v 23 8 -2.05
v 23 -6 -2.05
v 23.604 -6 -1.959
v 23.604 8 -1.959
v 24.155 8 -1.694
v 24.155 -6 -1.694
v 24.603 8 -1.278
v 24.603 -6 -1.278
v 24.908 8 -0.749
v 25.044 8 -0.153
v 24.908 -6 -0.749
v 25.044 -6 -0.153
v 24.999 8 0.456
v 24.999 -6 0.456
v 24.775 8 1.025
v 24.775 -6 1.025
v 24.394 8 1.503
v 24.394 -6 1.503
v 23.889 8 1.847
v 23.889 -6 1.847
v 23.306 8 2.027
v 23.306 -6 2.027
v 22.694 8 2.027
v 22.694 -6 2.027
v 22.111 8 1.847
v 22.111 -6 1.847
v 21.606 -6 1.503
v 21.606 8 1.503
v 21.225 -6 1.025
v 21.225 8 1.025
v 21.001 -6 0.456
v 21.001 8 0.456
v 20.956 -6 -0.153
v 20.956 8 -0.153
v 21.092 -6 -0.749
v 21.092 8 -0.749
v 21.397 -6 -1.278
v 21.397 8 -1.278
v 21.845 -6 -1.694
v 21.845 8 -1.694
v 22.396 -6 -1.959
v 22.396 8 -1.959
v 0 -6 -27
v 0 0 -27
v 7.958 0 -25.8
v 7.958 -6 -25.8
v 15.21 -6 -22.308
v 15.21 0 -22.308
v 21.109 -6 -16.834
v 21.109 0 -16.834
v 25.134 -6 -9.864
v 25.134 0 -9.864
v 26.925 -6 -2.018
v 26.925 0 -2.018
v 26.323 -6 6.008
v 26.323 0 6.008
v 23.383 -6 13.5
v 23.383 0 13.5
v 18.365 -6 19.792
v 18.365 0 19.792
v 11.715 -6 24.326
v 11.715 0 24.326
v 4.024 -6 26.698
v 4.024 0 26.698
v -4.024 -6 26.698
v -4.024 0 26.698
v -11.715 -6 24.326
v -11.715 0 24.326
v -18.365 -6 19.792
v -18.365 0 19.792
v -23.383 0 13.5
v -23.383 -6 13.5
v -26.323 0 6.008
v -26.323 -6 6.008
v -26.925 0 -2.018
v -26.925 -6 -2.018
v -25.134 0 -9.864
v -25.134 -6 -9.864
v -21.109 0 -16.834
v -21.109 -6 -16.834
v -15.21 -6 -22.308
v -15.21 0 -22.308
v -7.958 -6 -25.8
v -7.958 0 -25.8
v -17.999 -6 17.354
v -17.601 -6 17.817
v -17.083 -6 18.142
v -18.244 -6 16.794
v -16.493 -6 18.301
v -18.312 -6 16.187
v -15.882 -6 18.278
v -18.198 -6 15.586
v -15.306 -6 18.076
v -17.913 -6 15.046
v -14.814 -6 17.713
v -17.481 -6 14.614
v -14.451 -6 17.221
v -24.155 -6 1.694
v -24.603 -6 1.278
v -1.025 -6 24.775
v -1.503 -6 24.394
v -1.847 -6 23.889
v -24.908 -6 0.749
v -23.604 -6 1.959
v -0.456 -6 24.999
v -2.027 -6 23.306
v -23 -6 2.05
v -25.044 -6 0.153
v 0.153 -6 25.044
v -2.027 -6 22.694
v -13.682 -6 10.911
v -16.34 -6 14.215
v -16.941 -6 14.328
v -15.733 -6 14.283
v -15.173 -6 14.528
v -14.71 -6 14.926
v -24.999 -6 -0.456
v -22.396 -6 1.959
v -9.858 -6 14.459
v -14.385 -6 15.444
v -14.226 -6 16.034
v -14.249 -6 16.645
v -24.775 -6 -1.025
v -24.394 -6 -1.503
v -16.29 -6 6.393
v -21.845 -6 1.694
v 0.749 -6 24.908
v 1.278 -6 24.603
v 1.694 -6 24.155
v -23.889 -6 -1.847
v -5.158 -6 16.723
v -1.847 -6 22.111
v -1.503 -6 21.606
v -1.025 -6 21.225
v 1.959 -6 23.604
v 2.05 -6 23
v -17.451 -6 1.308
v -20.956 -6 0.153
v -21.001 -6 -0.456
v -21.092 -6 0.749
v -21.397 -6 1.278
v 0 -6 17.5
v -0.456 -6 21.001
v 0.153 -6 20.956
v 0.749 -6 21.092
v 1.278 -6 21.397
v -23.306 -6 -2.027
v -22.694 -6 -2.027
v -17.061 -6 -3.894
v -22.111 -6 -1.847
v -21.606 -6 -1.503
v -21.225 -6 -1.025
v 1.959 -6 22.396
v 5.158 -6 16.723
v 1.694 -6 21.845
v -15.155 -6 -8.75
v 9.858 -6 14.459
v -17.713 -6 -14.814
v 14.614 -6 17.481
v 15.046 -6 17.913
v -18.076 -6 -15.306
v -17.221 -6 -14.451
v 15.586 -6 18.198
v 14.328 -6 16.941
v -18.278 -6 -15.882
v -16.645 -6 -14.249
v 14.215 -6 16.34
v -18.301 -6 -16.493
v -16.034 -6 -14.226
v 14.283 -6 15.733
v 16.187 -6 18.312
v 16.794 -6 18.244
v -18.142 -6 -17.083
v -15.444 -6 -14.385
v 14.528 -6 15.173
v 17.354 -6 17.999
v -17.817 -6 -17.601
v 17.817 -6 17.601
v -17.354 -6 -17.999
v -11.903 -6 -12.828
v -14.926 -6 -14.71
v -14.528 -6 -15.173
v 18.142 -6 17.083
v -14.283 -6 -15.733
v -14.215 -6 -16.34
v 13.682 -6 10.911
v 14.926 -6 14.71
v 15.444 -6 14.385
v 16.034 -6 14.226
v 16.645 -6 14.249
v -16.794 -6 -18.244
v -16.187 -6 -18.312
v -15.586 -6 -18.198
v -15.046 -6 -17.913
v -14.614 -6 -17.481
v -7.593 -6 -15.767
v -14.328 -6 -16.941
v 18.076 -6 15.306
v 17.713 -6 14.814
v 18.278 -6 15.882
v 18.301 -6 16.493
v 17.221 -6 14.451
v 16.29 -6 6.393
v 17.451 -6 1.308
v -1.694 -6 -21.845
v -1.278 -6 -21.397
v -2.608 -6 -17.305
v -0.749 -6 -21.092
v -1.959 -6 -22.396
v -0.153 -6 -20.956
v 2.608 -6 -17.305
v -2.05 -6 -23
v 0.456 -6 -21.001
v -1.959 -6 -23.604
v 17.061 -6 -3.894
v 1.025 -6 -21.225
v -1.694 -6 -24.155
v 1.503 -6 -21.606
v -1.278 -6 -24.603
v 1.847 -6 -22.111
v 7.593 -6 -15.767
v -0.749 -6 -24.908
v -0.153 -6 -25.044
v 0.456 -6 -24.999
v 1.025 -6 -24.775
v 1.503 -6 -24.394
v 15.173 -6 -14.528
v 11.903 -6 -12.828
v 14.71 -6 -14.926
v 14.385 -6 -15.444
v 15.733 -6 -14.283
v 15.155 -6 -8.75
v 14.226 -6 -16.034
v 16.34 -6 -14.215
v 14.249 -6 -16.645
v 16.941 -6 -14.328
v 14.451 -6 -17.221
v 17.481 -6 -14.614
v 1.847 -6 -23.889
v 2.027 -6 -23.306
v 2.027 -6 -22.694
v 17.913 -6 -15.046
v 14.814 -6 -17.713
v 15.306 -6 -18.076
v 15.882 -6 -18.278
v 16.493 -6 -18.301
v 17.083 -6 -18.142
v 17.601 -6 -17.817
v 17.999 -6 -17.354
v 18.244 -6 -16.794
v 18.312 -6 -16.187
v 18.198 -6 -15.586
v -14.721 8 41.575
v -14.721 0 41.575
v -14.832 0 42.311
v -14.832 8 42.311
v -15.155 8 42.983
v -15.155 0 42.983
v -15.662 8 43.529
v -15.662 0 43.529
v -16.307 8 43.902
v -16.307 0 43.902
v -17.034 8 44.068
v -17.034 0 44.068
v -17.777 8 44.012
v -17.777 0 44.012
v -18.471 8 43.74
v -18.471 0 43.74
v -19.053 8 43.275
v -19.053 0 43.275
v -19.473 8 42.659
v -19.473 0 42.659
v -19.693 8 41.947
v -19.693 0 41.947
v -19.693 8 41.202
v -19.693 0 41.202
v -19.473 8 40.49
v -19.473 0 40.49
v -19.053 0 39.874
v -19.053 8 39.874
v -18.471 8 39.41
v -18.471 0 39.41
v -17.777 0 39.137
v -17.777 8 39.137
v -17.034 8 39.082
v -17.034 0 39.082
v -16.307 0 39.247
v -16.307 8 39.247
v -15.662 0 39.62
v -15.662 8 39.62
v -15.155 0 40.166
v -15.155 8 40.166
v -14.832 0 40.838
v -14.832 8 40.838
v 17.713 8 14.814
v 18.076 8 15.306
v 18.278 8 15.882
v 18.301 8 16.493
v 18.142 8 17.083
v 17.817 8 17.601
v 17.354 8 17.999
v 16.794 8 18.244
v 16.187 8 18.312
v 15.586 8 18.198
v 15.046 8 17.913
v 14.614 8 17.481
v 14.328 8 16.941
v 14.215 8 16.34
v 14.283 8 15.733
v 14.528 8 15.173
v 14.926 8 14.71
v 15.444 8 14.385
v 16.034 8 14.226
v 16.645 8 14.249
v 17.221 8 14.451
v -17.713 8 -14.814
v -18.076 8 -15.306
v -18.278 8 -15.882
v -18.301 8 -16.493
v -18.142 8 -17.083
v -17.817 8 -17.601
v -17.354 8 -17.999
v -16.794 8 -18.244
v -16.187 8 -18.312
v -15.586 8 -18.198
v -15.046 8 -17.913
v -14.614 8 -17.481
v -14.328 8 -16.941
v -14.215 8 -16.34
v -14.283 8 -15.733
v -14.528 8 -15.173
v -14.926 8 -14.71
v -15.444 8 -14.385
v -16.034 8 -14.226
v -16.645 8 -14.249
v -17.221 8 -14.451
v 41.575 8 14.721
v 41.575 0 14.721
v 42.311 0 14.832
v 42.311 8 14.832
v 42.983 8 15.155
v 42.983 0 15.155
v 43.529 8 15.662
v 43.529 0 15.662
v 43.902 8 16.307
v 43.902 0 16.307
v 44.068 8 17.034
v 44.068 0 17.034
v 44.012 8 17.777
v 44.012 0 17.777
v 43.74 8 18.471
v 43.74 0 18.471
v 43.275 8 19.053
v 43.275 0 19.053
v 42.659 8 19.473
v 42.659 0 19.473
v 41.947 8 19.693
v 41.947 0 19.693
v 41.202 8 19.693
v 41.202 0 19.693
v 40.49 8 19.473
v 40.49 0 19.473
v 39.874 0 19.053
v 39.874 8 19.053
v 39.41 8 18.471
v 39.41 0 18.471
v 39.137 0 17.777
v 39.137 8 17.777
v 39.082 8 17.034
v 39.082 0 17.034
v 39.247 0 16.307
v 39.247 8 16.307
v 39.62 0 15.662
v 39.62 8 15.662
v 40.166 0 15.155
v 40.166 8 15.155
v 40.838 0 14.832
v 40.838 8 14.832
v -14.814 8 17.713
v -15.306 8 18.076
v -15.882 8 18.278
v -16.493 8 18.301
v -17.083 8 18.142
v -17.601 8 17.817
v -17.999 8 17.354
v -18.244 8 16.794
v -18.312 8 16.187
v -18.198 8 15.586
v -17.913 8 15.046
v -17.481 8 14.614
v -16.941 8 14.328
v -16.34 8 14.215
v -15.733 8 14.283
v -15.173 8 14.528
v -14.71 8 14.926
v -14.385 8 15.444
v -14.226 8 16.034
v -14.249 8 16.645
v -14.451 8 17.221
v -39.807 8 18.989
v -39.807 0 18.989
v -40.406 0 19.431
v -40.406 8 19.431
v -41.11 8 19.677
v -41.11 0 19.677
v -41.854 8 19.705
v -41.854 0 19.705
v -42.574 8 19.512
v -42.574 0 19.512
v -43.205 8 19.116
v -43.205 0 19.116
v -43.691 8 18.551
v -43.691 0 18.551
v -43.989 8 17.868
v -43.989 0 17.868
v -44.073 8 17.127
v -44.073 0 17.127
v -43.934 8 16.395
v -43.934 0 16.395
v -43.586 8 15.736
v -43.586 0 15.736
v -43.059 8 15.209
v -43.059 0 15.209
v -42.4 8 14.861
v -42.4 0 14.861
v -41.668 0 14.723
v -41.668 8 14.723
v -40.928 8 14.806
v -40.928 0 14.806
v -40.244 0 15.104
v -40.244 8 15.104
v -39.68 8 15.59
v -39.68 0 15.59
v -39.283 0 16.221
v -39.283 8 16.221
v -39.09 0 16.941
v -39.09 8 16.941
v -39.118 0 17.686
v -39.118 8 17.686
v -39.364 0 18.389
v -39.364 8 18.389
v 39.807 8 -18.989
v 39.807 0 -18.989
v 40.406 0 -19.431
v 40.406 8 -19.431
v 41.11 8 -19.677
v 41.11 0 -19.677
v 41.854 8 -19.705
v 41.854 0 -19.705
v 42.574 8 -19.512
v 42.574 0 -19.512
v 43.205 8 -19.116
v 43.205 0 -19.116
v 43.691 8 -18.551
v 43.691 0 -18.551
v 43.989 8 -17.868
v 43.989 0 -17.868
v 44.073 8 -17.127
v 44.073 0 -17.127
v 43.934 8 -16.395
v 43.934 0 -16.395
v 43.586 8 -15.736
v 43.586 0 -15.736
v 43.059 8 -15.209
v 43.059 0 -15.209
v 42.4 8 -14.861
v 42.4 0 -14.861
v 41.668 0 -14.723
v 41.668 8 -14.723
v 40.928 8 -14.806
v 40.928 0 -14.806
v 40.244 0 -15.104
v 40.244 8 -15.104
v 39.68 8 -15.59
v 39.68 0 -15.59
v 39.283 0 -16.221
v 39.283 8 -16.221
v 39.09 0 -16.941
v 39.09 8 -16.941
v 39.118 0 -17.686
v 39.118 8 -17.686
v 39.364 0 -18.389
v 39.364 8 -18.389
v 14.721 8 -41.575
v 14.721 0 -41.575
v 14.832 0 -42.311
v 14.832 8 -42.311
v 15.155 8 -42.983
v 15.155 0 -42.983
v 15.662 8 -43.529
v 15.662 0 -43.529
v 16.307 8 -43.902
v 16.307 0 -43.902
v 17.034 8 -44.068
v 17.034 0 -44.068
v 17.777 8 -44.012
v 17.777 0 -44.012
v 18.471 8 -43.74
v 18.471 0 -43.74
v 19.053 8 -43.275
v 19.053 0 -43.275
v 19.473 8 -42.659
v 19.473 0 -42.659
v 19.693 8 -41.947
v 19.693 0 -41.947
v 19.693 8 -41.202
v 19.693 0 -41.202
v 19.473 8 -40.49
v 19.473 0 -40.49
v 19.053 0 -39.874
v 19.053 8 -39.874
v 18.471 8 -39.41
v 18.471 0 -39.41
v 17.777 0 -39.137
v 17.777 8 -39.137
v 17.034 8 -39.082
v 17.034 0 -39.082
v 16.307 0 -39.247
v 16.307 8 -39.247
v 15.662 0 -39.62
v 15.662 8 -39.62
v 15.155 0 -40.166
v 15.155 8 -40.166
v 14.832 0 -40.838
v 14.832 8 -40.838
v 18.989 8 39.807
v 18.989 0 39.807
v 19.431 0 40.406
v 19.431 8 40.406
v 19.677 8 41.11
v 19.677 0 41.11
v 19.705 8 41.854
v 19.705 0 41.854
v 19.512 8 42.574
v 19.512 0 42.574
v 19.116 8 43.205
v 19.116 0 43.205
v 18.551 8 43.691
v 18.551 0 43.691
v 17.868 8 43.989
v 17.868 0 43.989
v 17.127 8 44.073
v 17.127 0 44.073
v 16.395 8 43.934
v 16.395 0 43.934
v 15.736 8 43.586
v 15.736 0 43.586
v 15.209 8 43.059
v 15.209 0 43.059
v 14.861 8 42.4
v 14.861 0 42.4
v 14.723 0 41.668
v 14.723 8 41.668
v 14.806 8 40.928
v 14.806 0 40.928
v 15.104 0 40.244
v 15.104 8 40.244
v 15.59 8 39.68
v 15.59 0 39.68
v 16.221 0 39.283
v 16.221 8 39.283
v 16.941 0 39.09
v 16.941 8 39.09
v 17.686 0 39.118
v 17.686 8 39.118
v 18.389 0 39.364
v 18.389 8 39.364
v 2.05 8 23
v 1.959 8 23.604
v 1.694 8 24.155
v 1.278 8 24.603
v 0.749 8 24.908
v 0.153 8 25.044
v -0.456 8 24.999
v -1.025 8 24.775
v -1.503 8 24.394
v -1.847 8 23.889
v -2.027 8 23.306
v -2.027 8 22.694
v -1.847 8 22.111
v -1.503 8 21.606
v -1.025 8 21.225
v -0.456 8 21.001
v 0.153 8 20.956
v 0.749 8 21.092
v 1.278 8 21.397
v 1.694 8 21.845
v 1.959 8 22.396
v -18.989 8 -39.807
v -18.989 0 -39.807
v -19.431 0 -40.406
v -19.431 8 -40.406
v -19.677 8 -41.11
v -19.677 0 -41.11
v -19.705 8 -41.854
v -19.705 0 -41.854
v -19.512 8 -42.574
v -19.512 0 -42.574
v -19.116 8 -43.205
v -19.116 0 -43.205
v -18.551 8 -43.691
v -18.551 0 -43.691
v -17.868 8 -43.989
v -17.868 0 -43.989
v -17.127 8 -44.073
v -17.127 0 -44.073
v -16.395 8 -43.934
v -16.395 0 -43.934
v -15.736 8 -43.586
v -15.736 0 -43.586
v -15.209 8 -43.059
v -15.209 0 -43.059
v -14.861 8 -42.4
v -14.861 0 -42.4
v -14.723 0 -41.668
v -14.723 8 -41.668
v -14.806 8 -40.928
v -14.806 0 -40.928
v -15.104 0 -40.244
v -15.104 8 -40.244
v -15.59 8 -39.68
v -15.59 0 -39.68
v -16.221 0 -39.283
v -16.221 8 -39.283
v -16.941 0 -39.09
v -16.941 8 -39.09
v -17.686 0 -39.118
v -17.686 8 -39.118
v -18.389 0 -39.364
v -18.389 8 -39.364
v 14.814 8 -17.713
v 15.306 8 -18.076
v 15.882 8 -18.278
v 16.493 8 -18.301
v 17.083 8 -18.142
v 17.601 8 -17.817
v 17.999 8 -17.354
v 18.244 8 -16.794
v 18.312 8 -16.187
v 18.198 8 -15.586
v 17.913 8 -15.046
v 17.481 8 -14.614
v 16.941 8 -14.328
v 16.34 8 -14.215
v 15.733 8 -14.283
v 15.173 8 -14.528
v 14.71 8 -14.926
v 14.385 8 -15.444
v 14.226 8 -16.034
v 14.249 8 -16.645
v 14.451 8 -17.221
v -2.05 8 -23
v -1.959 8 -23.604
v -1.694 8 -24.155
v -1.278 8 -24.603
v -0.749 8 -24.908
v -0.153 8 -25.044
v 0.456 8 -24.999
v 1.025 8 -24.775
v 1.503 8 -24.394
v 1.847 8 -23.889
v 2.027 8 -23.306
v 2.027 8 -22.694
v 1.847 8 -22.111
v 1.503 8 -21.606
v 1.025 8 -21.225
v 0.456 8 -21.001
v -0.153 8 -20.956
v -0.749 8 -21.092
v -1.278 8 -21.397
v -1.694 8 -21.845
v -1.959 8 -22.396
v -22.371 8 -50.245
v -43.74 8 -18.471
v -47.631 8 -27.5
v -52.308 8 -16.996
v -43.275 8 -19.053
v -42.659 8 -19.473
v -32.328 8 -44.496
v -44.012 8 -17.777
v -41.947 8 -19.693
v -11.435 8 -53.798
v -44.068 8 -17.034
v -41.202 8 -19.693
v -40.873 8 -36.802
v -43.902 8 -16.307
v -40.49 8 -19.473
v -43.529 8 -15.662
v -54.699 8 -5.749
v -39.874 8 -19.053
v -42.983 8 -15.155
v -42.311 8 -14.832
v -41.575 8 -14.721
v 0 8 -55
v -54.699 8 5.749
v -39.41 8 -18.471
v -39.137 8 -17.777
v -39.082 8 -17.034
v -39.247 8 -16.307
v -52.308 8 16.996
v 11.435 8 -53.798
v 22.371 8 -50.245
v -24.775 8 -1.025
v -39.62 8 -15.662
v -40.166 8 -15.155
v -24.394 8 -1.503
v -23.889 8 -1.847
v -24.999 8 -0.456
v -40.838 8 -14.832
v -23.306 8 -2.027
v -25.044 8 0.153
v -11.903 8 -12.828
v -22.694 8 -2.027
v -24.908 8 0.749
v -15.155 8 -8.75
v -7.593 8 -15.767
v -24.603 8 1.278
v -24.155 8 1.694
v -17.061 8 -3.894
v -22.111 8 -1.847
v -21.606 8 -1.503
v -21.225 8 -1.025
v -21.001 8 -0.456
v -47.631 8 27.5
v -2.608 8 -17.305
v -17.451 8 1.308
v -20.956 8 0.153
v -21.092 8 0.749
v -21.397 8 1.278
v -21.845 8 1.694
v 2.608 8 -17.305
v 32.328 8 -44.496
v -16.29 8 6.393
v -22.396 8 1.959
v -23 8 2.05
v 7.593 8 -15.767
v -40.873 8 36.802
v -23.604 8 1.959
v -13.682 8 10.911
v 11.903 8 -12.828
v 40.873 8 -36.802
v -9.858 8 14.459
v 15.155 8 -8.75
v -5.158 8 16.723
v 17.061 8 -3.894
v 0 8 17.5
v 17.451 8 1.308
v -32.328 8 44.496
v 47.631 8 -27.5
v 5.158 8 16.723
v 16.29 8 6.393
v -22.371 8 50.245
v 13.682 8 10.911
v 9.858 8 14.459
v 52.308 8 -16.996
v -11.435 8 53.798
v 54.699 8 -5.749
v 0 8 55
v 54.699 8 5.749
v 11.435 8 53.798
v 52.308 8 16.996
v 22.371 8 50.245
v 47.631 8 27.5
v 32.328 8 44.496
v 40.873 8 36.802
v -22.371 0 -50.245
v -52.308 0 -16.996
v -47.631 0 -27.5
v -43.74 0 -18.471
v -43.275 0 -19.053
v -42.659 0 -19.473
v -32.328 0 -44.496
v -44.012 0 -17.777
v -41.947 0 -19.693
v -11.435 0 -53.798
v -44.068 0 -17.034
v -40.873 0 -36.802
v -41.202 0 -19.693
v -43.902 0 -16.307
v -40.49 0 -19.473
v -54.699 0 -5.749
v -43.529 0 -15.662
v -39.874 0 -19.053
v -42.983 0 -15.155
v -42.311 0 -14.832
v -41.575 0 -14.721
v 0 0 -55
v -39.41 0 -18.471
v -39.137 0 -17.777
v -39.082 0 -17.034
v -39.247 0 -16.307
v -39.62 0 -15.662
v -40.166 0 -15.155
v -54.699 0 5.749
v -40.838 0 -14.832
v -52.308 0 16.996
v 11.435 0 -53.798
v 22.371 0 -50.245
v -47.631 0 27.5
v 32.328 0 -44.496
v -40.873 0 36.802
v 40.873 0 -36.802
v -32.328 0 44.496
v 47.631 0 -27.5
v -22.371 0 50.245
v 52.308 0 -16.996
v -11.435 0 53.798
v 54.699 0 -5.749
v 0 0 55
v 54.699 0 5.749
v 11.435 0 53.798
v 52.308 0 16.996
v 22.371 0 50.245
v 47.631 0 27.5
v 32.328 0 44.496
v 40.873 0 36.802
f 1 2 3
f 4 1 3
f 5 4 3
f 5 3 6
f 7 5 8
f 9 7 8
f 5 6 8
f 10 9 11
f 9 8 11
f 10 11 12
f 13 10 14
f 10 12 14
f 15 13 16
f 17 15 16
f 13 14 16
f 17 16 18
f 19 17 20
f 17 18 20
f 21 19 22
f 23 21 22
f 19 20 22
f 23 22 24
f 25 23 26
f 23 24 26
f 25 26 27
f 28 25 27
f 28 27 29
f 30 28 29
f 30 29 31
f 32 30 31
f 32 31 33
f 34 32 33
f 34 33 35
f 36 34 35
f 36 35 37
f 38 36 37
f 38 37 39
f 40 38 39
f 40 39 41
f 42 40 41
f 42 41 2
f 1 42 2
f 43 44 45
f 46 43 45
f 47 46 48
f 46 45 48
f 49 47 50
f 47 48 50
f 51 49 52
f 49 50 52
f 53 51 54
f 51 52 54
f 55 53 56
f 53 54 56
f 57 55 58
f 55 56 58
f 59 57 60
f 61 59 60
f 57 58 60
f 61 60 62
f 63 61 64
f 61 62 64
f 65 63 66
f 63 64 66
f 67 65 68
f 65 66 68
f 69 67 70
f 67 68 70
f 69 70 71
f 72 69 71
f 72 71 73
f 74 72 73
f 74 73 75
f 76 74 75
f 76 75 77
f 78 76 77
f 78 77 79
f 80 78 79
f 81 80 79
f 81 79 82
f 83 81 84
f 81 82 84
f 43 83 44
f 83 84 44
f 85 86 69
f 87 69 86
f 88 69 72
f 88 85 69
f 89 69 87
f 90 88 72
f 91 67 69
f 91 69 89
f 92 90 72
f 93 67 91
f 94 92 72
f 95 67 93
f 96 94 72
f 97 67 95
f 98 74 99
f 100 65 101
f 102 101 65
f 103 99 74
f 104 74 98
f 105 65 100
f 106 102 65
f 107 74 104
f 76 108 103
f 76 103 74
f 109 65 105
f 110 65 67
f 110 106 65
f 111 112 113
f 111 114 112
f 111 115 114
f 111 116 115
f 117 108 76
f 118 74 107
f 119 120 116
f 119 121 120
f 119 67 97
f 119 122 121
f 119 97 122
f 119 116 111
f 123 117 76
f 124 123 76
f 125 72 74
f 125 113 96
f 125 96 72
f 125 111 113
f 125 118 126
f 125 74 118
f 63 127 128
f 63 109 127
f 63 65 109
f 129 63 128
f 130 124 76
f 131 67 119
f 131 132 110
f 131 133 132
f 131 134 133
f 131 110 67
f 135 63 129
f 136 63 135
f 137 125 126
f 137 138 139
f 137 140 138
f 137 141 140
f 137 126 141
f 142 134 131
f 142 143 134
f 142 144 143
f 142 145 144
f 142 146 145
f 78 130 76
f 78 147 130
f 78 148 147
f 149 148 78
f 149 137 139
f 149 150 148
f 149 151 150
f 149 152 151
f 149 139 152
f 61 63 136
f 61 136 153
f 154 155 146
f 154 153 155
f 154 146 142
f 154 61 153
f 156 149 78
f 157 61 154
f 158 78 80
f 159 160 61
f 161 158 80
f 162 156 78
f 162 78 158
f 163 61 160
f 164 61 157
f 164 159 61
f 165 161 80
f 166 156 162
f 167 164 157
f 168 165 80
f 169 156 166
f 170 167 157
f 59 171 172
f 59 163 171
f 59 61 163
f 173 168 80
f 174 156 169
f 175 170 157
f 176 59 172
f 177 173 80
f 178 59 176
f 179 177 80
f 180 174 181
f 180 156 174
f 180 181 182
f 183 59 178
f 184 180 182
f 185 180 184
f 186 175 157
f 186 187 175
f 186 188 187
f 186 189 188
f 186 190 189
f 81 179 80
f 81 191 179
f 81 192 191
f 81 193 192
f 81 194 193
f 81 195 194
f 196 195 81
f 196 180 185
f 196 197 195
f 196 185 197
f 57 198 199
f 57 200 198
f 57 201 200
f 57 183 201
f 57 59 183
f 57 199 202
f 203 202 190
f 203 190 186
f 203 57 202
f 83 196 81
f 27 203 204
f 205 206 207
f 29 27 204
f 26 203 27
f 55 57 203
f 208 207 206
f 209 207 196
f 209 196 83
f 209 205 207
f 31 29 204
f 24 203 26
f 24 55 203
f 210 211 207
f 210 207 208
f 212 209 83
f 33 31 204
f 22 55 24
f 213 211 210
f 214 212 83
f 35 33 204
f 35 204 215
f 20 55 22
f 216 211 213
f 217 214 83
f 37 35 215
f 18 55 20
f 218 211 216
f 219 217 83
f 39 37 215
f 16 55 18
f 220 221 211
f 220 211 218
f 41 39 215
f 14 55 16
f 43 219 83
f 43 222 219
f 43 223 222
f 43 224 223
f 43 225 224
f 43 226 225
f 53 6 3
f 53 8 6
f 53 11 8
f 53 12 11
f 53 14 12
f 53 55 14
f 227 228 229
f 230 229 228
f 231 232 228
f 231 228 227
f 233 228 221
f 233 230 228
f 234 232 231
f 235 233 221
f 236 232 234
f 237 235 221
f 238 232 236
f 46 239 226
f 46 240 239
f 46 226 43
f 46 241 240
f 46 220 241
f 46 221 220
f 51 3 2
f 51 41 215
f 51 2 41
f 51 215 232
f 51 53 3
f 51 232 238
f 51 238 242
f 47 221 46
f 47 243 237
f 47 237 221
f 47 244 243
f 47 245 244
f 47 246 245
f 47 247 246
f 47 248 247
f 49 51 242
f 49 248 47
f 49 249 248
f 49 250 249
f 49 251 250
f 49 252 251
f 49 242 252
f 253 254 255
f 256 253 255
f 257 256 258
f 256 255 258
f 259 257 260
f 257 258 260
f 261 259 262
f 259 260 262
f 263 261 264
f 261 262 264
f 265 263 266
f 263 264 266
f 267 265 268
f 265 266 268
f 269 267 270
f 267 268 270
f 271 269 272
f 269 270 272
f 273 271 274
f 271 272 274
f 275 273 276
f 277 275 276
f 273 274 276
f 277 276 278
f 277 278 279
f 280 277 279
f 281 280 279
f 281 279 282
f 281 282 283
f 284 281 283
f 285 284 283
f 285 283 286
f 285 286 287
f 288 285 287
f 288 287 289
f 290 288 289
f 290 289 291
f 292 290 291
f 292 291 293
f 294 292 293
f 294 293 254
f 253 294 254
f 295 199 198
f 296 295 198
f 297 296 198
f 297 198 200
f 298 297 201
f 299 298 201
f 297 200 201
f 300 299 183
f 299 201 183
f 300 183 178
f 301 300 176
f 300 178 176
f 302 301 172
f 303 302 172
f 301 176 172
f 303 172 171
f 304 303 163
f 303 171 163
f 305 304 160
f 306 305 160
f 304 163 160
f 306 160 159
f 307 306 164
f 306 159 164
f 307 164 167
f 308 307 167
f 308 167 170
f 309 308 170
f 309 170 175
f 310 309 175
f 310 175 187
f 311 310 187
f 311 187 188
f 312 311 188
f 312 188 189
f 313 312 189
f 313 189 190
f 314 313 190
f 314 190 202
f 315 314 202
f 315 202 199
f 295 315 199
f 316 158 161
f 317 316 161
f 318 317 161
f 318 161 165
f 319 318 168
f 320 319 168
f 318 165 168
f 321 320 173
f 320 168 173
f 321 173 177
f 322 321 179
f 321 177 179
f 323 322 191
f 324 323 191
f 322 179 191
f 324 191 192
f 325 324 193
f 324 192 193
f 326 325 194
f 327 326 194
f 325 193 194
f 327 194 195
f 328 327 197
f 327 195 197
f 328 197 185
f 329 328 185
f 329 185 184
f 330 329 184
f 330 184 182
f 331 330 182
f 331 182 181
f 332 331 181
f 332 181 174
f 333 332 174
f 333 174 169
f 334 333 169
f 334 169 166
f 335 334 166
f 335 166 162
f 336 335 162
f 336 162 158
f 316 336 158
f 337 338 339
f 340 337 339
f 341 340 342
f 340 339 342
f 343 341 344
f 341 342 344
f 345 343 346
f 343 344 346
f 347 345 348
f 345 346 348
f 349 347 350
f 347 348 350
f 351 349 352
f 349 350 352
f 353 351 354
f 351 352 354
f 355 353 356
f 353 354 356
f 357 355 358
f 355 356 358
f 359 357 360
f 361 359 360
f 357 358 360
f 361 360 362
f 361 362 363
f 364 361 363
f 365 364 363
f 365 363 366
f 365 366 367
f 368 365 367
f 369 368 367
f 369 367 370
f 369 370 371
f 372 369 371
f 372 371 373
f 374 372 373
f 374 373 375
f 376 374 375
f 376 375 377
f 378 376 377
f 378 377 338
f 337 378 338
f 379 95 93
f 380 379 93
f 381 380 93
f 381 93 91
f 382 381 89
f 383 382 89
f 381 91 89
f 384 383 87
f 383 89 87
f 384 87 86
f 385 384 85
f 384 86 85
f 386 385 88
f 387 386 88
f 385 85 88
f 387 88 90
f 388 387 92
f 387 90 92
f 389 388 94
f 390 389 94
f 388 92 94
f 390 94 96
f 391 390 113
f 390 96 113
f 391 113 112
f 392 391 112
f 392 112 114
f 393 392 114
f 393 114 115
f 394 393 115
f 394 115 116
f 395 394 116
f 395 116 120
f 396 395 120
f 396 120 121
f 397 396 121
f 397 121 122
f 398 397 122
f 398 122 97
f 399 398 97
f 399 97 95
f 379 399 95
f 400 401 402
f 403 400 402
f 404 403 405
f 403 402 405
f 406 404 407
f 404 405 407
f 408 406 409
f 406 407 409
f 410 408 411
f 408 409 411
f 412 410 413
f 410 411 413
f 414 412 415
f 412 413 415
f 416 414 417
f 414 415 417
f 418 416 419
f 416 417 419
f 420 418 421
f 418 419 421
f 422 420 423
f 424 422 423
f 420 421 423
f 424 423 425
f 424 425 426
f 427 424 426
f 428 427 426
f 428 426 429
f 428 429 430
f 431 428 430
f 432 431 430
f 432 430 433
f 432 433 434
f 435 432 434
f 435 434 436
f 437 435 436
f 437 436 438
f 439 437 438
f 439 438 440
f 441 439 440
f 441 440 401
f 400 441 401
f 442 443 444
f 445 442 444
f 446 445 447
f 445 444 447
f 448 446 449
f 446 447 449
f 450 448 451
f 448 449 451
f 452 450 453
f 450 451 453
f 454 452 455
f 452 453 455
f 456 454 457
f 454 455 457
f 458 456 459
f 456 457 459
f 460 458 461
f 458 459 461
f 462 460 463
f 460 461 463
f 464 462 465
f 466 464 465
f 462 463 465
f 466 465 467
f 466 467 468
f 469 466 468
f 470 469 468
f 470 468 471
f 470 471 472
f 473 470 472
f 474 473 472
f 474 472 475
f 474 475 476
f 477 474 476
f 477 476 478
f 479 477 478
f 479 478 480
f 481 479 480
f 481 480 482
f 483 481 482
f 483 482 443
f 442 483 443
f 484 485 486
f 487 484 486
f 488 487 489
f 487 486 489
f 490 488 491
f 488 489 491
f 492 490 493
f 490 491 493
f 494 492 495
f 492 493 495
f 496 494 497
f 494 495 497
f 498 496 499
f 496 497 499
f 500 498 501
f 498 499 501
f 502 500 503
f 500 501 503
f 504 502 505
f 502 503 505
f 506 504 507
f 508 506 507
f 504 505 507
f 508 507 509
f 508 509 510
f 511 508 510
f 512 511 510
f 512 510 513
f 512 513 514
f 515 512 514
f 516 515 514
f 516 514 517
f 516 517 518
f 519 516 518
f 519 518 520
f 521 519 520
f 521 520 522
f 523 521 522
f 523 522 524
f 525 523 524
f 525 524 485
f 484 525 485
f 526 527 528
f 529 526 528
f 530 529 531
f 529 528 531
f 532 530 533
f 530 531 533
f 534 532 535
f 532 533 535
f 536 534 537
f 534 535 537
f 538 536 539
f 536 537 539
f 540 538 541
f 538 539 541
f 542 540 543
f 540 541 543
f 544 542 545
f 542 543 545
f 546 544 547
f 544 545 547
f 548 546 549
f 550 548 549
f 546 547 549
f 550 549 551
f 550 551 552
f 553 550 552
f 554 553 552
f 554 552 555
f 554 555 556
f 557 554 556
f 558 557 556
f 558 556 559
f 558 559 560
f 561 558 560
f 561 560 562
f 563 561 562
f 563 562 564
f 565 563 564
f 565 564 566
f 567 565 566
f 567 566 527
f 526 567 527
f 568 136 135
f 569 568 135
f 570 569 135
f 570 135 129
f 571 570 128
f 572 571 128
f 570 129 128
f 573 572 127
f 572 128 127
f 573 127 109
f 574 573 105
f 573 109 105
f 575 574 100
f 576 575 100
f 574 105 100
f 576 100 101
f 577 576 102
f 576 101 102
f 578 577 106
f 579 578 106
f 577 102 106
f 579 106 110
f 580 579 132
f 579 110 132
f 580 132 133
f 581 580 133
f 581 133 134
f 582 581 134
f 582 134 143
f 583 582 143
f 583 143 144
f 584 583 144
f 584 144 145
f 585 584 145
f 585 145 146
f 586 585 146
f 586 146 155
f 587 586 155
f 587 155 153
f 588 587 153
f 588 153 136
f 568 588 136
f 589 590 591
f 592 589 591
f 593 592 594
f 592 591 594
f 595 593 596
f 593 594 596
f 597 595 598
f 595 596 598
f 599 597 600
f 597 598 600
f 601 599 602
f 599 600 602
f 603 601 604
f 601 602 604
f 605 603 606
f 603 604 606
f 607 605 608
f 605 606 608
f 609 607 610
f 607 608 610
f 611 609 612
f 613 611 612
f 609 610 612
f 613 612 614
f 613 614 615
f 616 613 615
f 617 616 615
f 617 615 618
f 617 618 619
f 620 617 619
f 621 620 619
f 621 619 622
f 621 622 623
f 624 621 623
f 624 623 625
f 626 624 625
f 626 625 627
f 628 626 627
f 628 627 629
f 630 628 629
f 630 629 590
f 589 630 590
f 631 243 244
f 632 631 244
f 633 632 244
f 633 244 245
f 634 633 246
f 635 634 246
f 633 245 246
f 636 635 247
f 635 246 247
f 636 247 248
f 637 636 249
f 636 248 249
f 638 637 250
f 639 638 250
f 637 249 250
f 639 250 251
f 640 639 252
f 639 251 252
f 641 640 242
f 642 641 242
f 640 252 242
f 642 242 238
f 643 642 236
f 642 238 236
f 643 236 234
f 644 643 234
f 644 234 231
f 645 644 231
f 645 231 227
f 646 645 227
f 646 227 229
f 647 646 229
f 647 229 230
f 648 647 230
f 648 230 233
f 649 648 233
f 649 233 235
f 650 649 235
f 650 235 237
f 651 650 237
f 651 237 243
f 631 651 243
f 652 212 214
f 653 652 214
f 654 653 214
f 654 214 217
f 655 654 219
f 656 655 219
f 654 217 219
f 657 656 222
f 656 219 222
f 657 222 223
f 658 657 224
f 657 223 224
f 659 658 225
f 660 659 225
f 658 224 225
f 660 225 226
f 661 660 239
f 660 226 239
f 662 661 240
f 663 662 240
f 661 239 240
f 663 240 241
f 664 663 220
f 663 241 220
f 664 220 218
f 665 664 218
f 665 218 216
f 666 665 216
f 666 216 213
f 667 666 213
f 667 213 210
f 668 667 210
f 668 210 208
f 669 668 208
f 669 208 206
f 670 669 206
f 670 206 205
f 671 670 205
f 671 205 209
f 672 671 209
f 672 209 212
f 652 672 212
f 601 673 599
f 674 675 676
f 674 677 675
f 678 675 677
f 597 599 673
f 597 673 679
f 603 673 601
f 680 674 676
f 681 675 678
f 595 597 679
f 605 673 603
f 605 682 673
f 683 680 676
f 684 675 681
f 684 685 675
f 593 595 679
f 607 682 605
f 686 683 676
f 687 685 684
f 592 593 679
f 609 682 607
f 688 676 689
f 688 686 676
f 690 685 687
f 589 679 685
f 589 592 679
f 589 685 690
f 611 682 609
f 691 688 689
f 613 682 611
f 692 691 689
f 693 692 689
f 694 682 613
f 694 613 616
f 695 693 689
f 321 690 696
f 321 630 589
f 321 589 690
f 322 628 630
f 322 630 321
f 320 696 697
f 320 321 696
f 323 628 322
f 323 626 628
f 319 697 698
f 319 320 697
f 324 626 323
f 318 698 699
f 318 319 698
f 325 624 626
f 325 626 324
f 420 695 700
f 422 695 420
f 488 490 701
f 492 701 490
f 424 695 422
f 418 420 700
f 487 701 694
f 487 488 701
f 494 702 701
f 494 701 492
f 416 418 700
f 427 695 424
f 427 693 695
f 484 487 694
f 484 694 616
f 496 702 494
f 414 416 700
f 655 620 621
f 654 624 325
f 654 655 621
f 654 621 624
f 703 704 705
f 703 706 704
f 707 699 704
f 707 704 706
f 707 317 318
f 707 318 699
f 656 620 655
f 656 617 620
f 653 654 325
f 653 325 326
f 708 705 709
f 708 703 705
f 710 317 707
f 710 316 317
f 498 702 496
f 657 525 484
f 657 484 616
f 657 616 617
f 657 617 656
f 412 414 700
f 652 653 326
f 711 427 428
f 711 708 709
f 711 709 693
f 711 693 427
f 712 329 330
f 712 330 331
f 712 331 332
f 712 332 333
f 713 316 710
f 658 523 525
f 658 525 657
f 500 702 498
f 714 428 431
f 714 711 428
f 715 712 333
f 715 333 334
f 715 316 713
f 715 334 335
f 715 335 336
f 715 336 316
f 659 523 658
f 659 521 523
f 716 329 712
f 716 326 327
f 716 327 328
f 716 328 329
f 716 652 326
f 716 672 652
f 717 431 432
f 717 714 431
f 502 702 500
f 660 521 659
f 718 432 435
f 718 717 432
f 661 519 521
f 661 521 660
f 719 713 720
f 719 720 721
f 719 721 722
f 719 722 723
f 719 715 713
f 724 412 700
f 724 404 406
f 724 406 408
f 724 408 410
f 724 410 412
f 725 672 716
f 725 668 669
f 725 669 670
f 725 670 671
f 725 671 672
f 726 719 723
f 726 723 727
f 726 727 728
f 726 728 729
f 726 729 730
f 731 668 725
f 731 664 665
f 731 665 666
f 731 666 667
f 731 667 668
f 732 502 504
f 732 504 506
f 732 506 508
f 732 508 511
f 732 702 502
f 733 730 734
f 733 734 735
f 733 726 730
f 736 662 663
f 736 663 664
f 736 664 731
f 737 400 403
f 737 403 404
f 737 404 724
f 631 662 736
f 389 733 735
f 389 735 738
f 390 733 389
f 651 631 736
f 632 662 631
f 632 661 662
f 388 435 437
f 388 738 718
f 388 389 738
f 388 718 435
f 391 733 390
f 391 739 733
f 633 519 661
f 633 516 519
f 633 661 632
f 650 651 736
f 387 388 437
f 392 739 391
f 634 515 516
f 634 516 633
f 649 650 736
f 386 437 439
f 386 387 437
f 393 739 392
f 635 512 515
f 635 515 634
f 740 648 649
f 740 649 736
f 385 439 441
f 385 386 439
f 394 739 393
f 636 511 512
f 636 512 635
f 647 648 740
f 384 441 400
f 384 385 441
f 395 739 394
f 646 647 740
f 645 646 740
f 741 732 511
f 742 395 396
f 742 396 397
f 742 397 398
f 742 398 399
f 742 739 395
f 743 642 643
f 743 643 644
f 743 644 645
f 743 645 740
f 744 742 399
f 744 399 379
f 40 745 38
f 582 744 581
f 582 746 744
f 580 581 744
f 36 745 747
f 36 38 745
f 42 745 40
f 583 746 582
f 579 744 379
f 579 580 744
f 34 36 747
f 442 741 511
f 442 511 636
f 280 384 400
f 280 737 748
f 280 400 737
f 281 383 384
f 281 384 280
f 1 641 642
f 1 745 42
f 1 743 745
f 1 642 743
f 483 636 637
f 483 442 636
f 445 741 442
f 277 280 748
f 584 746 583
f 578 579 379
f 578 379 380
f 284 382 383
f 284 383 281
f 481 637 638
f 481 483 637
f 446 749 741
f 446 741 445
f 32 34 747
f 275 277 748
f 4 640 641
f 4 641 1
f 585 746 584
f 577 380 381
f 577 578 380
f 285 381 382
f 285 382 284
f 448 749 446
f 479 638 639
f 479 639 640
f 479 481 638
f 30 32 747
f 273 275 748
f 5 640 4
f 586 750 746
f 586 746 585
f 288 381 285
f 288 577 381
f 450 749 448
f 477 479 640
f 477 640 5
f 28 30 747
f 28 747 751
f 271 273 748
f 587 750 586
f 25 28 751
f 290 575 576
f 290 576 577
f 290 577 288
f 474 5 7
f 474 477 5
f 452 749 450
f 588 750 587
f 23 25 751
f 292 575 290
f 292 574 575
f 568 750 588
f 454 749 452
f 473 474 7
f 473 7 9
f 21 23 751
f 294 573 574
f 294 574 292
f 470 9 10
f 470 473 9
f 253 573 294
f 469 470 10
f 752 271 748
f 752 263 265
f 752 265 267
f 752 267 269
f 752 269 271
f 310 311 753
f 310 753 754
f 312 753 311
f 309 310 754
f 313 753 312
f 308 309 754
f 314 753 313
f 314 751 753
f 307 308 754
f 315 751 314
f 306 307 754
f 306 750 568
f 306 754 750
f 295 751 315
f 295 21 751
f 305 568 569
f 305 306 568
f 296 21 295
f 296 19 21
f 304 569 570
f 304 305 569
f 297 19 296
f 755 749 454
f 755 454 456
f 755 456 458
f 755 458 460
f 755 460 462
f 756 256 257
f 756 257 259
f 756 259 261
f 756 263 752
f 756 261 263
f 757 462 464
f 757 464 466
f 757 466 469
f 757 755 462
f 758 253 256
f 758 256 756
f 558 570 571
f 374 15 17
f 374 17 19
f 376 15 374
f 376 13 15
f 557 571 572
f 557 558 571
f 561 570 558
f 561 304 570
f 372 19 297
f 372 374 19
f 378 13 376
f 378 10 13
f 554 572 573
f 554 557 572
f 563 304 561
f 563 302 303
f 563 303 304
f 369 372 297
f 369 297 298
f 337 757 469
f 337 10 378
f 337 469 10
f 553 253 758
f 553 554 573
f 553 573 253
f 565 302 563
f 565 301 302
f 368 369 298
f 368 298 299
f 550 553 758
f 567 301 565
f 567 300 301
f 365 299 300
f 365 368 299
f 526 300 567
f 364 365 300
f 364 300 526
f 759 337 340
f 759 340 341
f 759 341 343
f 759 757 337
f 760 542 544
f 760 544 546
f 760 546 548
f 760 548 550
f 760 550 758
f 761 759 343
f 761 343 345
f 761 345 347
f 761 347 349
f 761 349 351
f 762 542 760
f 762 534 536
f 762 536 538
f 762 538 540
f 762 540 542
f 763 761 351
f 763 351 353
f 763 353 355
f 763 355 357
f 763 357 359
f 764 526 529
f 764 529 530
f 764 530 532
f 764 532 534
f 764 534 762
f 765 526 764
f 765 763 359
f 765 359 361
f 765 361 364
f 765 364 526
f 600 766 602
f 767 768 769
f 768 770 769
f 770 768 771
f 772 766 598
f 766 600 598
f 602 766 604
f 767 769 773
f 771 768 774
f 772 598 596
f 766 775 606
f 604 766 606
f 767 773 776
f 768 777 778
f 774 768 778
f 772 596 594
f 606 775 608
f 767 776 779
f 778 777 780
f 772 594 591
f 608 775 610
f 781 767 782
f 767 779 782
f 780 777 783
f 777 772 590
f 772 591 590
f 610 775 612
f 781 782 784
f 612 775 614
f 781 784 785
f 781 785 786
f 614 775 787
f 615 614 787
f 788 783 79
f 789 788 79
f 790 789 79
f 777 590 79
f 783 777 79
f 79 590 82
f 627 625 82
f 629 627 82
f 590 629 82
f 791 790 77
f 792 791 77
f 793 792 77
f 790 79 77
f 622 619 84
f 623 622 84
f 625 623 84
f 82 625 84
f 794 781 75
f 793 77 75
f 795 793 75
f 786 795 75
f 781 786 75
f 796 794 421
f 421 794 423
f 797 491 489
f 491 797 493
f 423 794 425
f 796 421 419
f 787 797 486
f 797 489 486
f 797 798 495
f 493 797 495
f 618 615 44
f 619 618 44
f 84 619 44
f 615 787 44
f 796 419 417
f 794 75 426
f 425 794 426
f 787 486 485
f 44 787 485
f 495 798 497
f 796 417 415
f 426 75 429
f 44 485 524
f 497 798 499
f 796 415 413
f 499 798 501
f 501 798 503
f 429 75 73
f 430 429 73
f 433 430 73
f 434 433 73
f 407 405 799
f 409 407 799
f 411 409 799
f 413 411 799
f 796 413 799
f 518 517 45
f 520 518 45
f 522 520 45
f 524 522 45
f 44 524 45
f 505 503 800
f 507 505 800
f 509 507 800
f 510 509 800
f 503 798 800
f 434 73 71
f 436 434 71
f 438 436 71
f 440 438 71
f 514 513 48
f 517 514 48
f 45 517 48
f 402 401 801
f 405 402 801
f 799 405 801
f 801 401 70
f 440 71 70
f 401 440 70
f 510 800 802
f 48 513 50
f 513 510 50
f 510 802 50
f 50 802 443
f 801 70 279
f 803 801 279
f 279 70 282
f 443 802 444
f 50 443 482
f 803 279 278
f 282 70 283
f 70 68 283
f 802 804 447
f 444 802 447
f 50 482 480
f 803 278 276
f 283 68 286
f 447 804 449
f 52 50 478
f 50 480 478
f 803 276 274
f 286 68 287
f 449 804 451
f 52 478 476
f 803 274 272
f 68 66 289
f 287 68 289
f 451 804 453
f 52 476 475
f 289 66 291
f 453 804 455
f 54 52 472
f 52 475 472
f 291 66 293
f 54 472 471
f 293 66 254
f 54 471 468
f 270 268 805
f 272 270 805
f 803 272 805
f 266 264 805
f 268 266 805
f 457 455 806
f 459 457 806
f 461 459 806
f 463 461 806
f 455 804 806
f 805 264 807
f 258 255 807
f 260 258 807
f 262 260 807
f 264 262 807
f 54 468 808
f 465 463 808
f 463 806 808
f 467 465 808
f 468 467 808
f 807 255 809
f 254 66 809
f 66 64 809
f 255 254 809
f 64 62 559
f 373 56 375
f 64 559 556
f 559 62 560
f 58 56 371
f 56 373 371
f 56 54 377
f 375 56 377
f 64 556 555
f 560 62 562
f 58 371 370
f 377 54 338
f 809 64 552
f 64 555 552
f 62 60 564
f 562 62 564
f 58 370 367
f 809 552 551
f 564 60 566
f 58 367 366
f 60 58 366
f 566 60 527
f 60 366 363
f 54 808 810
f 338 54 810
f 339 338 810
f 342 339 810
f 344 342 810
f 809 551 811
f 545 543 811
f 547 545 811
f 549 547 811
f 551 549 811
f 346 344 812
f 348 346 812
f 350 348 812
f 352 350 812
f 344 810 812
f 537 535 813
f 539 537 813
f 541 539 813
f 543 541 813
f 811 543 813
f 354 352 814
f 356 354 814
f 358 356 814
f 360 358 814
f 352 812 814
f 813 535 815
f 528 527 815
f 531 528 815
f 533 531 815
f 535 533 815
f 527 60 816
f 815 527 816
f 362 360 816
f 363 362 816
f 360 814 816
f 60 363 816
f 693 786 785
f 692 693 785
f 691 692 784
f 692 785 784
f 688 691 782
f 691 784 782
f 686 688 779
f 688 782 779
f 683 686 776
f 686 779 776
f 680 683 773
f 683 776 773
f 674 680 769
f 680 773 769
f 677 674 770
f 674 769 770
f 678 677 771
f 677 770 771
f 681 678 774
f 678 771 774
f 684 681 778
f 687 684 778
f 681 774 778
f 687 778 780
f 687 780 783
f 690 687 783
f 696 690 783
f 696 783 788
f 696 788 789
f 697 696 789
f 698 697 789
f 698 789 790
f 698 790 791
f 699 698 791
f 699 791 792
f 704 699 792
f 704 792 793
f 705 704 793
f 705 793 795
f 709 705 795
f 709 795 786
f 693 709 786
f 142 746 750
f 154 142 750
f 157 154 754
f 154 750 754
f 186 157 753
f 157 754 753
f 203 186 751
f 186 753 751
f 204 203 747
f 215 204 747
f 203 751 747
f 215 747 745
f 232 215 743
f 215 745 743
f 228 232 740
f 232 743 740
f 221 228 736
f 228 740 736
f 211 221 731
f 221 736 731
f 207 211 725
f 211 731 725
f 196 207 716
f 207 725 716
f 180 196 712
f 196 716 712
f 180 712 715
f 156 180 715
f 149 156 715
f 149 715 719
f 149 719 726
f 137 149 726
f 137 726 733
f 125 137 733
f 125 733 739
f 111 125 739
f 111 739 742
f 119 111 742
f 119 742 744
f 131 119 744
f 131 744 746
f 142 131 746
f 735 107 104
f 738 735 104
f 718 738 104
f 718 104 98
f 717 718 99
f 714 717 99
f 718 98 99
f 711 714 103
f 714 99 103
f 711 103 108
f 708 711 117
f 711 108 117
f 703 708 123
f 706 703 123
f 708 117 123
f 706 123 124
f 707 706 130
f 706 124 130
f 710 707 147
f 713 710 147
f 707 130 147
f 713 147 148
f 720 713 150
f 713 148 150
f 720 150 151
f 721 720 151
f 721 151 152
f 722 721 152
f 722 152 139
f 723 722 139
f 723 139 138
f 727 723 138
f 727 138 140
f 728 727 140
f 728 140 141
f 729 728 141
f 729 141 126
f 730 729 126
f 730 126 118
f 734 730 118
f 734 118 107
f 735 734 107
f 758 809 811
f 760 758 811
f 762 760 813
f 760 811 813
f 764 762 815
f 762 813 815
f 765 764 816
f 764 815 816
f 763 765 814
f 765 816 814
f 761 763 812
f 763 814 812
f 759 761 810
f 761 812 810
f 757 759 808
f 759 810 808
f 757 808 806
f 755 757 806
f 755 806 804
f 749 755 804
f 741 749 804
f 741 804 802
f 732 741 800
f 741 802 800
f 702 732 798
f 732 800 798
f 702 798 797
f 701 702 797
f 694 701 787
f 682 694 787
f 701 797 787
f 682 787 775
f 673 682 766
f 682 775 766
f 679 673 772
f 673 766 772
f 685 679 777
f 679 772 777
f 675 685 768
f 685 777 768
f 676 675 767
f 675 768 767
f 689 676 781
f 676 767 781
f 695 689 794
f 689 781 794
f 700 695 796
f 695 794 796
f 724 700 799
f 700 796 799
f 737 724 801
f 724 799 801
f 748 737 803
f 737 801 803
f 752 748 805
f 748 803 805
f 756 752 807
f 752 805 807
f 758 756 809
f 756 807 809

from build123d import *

# Parameters (mm, degrees)
SKETCH1_R                   = 55
BOSS_EXTRUDE1_DEPTH         = 8
SKETCH2_R                   = 27
BOSS_EXTRUDE2_DEPTH         = 6
SKETCH3_R                   = 17.5
CUT_EXTRUDE1_DEPTH          = 80.031639234
M4_CLEARANCE_HOLE1_D        = 4.1
CIRPATTERN1_COUNT           = 8
TAP_DRILL_FOR_M6X1_0_TAP1_D = 5
CIRPATTERN2_COUNT           = 8


with BuildPart() as part:
    # Sketch1 → Boss-Extrude1 (new body)
    with BuildSketch(Plane(origin=(0, 0, 0), x_dir=(1, 0, 0), z_dir=(0, 1, 0))):
        with Locations(Location((0, 0, 0), (0, 0, 270))):
            Circle(SKETCH1_R)
    extrude(amount=BOSS_EXTRUDE1_DEPTH)

    # Sketch2 → Boss-Extrude2 (add)
    with BuildSketch(Plane.XZ):
        with Locations(Location((0, 0, 0), (0, 0, 270))):
            Circle(SKETCH2_R)
    extrude(amount=BOSS_EXTRUDE2_DEPTH)

    # Sketch3 → Cut-Extrude1 (cut, through all)
    with BuildSketch(Plane(origin=(0, 8, 0), x_dir=(1, 0, 0), z_dir=(0, 1, 0))):
        with Locations(Location((0, 0, 0), (0, 0, 270))):
            Circle(SKETCH3_R)
    extrude(amount=-CUT_EXTRUDE1_DEPTH, mode=Mode.SUBTRACT)

    # M4 Clearance Hole1 (through all)
    with Locations(Plane(origin=(0, 8, 0), x_dir=(1, 0, 0), z_dir=(0, 1, 0))):
        with Locations((0, 23)):
            m4_clearance_hole1 = Hole(M4_CLEARANCE_HOLE1_D / 2)

    # CirPattern1: M4 Clearance Hole1 ×8 about axis
    cirpattern1_axis = Axis((0, 0, 0), (0, 1, 0))
    for i in range(1, CIRPATTERN1_COUNT):
        add(m4_clearance_hole1.rotate(cirpattern1_axis, i * 360 / CIRPATTERN1_COUNT), mode=Mode.SUBTRACT)

    # Tap Drill for M6x1.0 Tap1 (through all)
    with Locations(Plane(origin=(0, 8, 0), x_dir=(1, 0, 0), z_dir=(0, 1, 0))):
        with Locations((17.220754456, 41.574578963)):
            tap_drill_for_m6x1_0_tap1 = Hole(TAP_DRILL_FOR_M6X1_0_TAP1_D / 2)

    # CirPattern2: Tap Drill for M6x1.0 Tap1 ×8 about axis
    cirpattern2_axis = Axis((0, 0, 0), (0, 1, 0))
    for i in range(1, CIRPATTERN2_COUNT):
        add(tap_drill_for_m6x1_0_tap1.rotate(cirpattern2_axis, i * 360 / CIRPATTERN2_COUNT), mode=Mode.SUBTRACT)


solid = part.part
